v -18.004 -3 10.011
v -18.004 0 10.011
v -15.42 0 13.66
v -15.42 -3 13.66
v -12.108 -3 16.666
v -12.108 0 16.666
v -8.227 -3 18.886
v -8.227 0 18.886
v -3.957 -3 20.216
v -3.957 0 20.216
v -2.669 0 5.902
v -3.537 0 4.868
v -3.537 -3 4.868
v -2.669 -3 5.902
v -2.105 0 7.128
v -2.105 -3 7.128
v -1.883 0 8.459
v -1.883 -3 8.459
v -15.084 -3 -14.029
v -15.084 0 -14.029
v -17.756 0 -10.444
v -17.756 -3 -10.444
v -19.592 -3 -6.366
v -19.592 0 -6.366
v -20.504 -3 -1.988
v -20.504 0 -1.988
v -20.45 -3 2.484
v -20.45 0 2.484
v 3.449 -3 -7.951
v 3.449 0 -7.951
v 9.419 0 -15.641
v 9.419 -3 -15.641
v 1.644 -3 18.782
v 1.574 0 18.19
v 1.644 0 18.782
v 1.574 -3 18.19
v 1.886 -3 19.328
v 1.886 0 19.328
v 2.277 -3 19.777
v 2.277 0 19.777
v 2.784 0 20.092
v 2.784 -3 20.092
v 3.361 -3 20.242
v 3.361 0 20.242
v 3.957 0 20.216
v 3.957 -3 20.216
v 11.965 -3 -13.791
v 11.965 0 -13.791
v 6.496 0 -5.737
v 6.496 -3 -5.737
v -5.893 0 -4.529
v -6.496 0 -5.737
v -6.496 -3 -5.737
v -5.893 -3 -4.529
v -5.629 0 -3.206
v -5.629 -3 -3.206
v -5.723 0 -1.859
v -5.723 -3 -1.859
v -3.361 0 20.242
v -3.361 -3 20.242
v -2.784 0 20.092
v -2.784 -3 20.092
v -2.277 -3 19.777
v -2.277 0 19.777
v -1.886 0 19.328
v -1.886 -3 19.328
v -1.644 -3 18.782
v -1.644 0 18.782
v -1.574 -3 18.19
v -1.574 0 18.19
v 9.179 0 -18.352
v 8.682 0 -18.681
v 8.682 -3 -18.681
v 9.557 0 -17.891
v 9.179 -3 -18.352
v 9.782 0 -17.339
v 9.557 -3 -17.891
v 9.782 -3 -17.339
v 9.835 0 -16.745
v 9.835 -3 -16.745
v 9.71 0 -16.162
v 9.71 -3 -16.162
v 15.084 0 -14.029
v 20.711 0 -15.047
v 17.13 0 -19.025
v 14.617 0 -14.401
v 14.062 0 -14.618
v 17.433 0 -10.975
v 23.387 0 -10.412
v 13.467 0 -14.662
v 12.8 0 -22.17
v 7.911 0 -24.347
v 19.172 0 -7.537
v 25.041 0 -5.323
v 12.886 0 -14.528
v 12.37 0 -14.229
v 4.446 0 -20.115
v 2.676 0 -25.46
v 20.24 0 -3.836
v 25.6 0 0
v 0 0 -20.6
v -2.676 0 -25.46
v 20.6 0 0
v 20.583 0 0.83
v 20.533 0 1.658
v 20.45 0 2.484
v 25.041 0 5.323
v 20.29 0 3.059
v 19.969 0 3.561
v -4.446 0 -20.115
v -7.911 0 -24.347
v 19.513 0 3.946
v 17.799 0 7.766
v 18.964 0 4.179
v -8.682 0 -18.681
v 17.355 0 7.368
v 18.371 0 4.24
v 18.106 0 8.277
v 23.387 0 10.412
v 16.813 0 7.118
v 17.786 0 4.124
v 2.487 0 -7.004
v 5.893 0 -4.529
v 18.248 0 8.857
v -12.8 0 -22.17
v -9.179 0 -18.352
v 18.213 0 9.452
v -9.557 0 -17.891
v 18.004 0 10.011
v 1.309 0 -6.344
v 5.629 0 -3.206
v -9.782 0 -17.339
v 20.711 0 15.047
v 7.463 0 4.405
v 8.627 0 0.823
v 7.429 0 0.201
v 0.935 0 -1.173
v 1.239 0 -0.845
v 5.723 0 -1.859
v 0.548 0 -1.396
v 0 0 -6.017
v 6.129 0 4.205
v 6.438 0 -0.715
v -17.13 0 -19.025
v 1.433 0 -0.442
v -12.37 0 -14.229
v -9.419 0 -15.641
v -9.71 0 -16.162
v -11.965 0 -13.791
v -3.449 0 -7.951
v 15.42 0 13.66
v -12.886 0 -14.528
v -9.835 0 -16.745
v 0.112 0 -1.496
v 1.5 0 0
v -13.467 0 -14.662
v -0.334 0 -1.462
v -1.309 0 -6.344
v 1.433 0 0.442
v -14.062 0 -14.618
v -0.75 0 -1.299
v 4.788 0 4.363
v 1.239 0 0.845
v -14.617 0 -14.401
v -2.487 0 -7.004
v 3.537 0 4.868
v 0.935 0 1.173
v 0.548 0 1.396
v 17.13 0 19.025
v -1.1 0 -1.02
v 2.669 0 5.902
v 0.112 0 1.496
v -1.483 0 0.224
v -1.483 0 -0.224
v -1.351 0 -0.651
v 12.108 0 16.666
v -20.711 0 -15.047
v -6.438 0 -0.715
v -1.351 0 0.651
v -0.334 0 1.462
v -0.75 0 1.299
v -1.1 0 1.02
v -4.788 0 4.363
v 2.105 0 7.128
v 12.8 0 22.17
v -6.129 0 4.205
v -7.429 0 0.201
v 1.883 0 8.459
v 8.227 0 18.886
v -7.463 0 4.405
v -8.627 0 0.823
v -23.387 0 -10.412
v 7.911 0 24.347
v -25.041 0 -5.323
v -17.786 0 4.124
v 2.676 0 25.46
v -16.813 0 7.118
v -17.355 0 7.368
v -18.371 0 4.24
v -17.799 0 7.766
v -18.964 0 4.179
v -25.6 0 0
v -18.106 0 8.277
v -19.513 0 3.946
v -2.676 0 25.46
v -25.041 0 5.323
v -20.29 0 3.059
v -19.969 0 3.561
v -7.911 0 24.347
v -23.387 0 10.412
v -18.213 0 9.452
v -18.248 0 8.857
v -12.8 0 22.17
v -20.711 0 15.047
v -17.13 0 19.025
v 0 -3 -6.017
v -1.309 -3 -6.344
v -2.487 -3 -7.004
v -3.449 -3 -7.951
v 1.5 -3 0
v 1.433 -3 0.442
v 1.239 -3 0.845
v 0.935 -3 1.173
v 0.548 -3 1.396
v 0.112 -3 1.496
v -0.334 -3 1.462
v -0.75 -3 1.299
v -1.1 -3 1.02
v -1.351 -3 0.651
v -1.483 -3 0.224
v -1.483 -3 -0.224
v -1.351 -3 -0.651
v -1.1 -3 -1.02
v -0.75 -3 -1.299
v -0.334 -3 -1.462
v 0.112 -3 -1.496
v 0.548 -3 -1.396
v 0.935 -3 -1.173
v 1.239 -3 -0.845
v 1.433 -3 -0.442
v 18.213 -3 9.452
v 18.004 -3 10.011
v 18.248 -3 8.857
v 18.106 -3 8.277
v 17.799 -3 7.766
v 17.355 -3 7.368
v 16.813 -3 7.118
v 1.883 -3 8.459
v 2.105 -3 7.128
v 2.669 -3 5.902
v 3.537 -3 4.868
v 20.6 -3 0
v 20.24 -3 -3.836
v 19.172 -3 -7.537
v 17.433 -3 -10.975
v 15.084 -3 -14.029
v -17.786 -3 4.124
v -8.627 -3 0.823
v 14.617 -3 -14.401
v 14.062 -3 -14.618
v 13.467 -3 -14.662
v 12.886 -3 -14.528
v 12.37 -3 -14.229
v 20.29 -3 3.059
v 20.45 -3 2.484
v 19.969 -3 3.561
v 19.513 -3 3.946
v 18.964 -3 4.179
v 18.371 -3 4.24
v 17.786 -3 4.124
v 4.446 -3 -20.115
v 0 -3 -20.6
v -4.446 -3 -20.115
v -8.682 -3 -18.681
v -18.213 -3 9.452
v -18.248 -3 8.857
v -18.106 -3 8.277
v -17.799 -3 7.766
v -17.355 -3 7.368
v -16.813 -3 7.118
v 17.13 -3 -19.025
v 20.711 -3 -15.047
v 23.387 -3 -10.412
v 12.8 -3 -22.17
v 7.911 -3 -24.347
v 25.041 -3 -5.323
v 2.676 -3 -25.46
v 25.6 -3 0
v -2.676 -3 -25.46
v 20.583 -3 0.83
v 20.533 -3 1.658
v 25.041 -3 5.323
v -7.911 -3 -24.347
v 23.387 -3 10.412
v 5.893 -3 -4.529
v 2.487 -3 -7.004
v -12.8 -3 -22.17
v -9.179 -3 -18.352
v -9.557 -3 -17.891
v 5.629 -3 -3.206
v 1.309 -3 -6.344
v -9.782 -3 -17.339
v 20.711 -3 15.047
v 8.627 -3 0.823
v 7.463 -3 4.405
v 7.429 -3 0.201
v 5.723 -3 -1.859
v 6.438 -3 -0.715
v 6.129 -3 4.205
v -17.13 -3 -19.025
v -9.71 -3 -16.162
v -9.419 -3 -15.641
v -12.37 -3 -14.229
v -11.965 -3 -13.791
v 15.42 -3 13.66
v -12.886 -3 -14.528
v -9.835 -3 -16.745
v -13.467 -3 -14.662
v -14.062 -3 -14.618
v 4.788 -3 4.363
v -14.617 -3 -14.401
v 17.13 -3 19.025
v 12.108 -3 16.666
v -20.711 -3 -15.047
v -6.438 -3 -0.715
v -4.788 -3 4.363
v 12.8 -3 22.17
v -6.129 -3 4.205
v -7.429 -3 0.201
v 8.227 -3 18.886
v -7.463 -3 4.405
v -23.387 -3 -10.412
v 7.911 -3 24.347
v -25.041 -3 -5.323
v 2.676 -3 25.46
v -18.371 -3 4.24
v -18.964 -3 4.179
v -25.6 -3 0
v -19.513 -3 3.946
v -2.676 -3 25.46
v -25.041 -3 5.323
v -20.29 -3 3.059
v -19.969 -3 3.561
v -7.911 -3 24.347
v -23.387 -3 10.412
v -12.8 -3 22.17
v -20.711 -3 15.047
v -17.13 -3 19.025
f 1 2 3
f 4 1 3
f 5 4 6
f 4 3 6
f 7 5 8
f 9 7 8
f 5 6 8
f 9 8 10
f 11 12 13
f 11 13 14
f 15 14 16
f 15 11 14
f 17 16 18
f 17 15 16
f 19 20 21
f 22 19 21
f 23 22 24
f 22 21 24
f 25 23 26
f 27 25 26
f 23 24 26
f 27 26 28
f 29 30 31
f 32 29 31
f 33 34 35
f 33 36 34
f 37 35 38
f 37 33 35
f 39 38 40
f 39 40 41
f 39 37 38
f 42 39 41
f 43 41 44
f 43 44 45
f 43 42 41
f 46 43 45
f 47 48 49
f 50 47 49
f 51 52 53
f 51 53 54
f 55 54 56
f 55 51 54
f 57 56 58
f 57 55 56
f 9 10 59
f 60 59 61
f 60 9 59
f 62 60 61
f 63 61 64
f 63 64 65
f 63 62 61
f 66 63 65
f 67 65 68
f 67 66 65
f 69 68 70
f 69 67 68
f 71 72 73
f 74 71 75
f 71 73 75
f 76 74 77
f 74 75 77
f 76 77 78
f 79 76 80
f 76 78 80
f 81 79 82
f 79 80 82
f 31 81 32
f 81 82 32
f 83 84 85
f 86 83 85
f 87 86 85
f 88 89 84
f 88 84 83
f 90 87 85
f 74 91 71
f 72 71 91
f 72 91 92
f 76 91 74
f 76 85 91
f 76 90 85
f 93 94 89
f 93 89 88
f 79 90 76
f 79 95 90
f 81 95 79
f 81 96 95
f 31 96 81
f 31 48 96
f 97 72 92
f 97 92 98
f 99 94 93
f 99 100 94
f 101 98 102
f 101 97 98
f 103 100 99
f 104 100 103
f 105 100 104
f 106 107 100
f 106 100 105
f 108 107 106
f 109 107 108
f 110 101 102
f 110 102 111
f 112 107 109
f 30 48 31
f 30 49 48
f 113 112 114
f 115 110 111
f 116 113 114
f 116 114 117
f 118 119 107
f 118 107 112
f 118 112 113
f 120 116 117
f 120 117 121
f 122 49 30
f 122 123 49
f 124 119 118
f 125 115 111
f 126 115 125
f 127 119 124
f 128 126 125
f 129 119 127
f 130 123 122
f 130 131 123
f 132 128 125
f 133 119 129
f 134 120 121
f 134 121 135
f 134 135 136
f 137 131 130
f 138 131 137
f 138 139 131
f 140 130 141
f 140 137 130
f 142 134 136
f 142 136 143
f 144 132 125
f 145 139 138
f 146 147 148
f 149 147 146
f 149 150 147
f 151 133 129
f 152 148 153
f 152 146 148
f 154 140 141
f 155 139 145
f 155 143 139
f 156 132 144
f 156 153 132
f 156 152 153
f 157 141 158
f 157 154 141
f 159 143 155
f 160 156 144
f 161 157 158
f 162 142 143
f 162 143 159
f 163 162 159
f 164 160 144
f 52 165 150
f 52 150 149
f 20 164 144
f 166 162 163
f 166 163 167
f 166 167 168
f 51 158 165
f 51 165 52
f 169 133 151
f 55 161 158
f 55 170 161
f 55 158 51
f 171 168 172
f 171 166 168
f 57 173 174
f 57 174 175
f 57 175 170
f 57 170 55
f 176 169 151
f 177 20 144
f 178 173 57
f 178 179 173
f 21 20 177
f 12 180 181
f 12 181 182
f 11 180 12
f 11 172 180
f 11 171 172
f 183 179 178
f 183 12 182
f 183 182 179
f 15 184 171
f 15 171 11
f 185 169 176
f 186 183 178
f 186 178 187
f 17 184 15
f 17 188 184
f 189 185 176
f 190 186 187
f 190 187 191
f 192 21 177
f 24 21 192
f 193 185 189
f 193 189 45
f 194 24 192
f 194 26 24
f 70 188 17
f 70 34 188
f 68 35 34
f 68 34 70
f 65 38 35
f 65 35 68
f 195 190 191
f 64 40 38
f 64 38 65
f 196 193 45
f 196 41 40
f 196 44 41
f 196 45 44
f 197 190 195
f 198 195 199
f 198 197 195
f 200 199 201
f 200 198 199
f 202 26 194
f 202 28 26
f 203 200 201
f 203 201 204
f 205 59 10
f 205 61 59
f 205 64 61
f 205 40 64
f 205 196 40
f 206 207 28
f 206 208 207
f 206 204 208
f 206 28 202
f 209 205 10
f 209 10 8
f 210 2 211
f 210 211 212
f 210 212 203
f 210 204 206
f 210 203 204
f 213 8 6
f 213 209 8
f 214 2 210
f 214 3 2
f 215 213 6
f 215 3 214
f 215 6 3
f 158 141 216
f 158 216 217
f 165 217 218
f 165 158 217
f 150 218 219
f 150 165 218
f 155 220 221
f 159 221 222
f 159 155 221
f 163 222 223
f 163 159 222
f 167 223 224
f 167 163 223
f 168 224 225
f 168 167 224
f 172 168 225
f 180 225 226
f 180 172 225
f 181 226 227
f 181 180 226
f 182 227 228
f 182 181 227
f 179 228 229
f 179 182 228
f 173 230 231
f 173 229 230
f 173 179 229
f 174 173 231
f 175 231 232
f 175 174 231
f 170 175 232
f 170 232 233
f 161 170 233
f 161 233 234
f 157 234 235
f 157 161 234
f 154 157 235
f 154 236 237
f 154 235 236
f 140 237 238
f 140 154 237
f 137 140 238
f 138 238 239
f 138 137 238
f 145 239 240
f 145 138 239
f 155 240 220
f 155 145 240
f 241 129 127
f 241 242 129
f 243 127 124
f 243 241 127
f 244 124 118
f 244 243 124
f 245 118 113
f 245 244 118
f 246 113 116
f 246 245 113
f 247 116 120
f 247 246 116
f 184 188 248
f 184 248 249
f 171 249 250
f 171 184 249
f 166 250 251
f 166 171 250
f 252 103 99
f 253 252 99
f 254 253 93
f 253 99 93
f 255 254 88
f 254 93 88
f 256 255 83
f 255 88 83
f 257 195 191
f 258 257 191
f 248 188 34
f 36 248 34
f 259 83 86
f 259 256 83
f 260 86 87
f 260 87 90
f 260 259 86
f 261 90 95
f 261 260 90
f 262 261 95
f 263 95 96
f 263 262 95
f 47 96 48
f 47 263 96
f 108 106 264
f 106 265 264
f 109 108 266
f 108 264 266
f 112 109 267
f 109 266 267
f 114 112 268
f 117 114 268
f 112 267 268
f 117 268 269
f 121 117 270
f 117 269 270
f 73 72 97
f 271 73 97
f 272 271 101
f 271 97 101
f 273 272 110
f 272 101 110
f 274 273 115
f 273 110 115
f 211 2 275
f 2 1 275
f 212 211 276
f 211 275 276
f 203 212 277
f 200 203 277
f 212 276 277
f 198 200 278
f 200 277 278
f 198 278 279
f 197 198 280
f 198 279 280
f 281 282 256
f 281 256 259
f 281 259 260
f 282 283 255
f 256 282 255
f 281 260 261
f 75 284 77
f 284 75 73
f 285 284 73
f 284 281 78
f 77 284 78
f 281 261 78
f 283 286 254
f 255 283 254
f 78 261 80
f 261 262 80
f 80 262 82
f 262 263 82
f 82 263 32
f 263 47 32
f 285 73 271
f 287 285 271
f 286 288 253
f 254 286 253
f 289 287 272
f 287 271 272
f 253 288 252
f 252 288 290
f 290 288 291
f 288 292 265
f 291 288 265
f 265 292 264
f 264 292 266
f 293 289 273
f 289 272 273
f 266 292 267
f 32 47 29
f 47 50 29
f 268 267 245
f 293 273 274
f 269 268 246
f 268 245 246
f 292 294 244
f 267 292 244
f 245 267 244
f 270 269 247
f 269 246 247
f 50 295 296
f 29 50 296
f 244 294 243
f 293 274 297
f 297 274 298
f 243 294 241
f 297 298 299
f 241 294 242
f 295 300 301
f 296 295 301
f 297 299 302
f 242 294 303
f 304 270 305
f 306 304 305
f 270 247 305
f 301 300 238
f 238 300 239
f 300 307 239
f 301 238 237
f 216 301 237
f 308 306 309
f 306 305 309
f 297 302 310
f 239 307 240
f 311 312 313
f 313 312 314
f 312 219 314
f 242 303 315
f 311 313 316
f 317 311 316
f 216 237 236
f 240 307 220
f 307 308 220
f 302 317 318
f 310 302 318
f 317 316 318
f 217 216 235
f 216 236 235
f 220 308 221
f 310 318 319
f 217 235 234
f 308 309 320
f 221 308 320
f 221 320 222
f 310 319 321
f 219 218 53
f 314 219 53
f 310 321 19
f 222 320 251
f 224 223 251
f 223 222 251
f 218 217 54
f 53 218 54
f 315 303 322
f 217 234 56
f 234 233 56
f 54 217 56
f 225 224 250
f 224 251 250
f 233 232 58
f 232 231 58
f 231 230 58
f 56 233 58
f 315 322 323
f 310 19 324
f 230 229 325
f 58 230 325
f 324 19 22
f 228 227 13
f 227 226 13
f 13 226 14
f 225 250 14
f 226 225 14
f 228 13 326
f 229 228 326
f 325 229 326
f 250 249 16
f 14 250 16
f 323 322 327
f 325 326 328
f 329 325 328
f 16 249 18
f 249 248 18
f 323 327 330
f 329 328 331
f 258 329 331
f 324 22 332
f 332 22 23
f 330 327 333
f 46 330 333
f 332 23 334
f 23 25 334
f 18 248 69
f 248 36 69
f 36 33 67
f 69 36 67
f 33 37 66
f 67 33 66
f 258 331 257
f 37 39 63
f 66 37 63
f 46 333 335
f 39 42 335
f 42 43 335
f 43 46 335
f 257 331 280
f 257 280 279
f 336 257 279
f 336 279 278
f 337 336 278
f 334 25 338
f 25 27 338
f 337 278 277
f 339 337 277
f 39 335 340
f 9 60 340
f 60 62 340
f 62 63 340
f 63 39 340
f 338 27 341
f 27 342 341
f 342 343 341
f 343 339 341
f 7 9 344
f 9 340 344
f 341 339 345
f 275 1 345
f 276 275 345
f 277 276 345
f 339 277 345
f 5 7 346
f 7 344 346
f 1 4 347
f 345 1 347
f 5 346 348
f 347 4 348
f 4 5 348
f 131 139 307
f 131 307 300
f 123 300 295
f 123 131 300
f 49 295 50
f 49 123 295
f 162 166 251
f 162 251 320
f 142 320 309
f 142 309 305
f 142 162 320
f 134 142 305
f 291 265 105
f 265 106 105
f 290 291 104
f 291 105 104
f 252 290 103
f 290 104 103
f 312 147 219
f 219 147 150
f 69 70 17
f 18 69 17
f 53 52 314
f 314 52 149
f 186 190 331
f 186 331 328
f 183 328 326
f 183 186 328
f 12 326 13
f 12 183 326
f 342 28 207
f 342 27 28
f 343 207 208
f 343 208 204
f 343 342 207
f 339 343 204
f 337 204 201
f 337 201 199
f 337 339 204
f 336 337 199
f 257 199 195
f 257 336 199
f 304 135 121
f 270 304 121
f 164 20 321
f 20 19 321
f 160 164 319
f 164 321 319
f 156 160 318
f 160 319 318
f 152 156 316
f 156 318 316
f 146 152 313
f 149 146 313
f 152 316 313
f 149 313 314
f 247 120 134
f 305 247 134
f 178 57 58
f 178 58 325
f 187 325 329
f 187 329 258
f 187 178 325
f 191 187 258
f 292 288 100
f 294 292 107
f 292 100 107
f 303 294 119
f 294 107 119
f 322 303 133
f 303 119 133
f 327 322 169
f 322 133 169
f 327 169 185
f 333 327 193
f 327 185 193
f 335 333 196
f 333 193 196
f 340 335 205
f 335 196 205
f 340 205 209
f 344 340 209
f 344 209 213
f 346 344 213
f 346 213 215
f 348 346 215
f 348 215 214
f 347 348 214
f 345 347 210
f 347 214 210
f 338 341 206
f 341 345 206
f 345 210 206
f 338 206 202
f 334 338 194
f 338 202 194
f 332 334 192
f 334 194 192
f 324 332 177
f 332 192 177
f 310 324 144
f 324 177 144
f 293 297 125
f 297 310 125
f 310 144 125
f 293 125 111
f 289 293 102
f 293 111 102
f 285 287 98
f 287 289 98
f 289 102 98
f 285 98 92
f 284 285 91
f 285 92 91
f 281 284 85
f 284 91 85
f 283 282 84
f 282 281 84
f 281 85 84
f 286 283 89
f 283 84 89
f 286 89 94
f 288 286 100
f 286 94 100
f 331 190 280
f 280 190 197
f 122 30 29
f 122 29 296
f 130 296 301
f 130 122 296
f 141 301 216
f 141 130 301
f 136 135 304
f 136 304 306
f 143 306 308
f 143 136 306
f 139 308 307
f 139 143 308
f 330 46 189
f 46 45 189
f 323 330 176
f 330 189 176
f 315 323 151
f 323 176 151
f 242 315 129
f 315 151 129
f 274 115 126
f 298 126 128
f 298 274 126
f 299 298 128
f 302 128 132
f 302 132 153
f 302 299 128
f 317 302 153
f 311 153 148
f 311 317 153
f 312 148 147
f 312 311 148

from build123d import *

# Parameters (mm, degrees)
F0_R        = 25.6
F0_R_2      = 1.5
F1_DEPTH    = 3
F2_COUNT    = 5
F3_T1_DEPTH = 3
F4_R        = 2


# Not quite as in the source:
# - a fillet or chamfer that OpenCascade refuses, or shapes differently, is made with other operations: its cross-section is extruded or revolved along the edge and cut away or added


with BuildPart() as f1:
    # F0 (on Front) → F1 (new body)
    with BuildSketch(Plane.XZ):
        Circle(F0_R)
        with BuildLine():
            ThreePointArc((-1.4990055262, 20.5453883495), (0, 20.6), (1.4990055262, 20.5453883495))
            ThreePointArc((1.4990055262, 20.5453883495), (15.0870725099, 14.0264123382), (20.6, 0))
            ThreePointArc((20.6, 0), (-14.0264123382, -15.0870725099), (-1.4990055262, 20.5453883495))
        make_face(mode=Mode.SUBTRACT)
        with BuildLine():
            ThreePointArc((-1.9720265944, 5.6666666667), (-3.4761933515, -4.8904069139), (6, 0))
            ThreePointArc((6, 0), (4.8904069139, 3.4761933515), (1.9720265944, 5.6666666667))
            ThreePointArc((1.9720265944, 5.6666666667), (0, 6), (-1.9720265944, 5.6666666667))
        make_face()
        Circle(F0_R_2, mode=Mode.SUBTRACT)
        with BuildLine():
            ThreePointArc((-1.9720265944, 5.6666666667), (0, 6), (1.9720265944, 5.6666666667))
            Line((1.9720265944, 5.6666666667), (1.4990055262, 20.5453883495))
            ThreePointArc((1.4990055262, 20.5453883495), (0, 20.6), (-1.4990055262, 20.5453883495))
            Line((-1.4990055262, 20.5453883495), (-1.9720265944, 5.6666666667))
        make_face()
    extrude(amount=F1_DEPTH)

    # F2: F1 ×5 about axis
    f2_axis = Axis((0, 0, 0), (0, -1, 0))


with BuildPart() as f1_1:
    add(f1.part)
    for i in range(1, F2_COUNT):
        add(f1.part.rotate(f2_axis, i * 360 / F2_COUNT))

    # F3: fillet of radius 5.08 on 10 edges, made by hand

    # F3_s2 → F3_t1 (join)
    with BuildSketch(Plane.XZ):
        with BuildLine():
            ThreePointArc((1.8832465894, 8.4592124416), (2.4124774845, 6.3578379743), (3.7693220099, 4.6682128899))
            ThreePointArc((3.7693220099, 4.6682128899), (2.9137601883, 5.244997766), (1.9720265944, 5.6666666667))
            Line((1.9720265944, 5.6666666667), (1.8832465894, 8.4592124416))
        make_face()
        with BuildLine():
            ThreePointArc((3.2749497301, 5.0273953759), (5.3011666938, 4.2590824136), (7.4632339146, 4.4051143441))
            Line((7.4632339146, 4.4051143441), (4.779930528, 3.6266050443))
            ThreePointArc((4.779930528, 3.6266050443), (4.0878878875, 4.3919440592), (3.2749497301, 5.0273953759))
        make_face()
        with BuildLine():
            ThreePointArc((5.7933522546, -1.5611116727), (5.6887786813, -3.7255802818), (6.4957788146, -5.7367020526))
            Line((6.4957788146, -5.7367020526), (4.9261861245, -3.4253014855))
            ThreePointArc((4.9261861245, -3.4253014855), (5.440213845, -2.5306270607), (5.7933522546, -1.5611116727))
        make_face()
        with BuildLine():
            ThreePointArc((-3.7693220099, 4.6682128899), (-2.4124774845, 6.3578379743), (-1.8832465894, 8.4592124416))
            Line((-1.8832465894, 8.4592124416), (-1.9720265944, 5.6666666667))
            ThreePointArc((-1.9720265944, 5.6666666667), (-2.9137601883, 5.244997766), (-3.7693220099, 4.6682128899))
        make_face()
        with BuildLine():
            ThreePointArc((-7.4632339146, 4.4051143441), (-5.3011666938, 4.2590824136), (-3.2749497301, 5.0273953759))
            ThreePointArc((-3.2749497301, 5.0273953759), (-4.0878878875, 4.3919440592), (-4.779930528, 3.6266050443))
            Line((-4.779930528, 3.6266050443), (-7.4632339146, 4.4051143441))
        make_face()
        with BuildLine():
            ThreePointArc((-5.6045188467, -2.1422811432), (-6.7921597763, -0.3297224505), (-8.627144316, 0.8229664629))
            Line((-8.627144316, 0.8229664629), (-5.99870999, -0.1244124414))
            ThreePointArc((-5.99870999, -0.1244124414), (-5.888690719, -1.1503571689), (-5.6045188467, -2.1422811432))
        make_face()
        with BuildLine():
            ThreePointArc((-6.4957788146, -5.7367020526), (-5.6887786813, -3.7255802818), (-5.7933522546, -1.5611116727))
            ThreePointArc((-5.7933522546, -1.5611116727), (-5.440213845, -2.5306270607), (-4.9261861245, -3.4253014855))
            Line((-4.9261861245, -3.4253014855), (-6.4957788146, -5.7367020526))
        make_face()
        with BuildLine():
            ThreePointArc((0.3055388721, -5.9922154499), (-1.7853081143, -6.5616176556), (-3.4486218238, -7.950591196))
            Line((-3.4486218238, -7.950591196), (-1.7353800681, -5.7435577841))
            ThreePointArc((-1.7353800681, -5.7435577841), (-0.7256508252, -5.9559575955), (0.3055388721, -5.9922154499))
        make_face()
        with BuildLine():
            ThreePointArc((3.4486218238, -7.950591196), (1.7853081143, -6.5616176556), (-0.3055388721, -5.9922154499))
            ThreePointArc((-0.3055388721, -5.9922154499), (0.7256508252, -5.9559575955), (1.7353800681, -5.7435577841))
            Line((1.7353800681, -5.7435577841), (3.4486218238, -7.950591196))
        make_face()
        with BuildLine():
            ThreePointArc((8.627144316, 0.8229664629), (6.7921597763, -0.3297224505), (5.6045188467, -2.1422811432))
            ThreePointArc((5.6045188467, -2.1422811432), (5.888690719, -1.1503571689), (5.99870999, -0.1244124414))
            Line((5.99870999, -0.1244124414), (8.627144316, 0.8229664629))
        make_face()
    extrude(amount=F3_T1_DEPTH)

    # F4
    f4_edges = [f1_1.edges().sort_by_distance(p)[0] for p in [
        (1.499006, -1.5, 20.545388),
        (-20.003044, -1.5, 4.923235),
        (20.003044, -1.5, 4.923235),
        (10.863555, -1.5, -17.502662),
        (-1.499006, -1.5, 20.545388),
        (19.076607, -1.5, 7.774513),
        (13.288997, -1.5, -15.740475),
        (-19.076607, -1.5, 7.774513),
        (-10.863555, -1.5, -17.502662),
        (-13.288997, -1.5, -15.740475),
    ]]
    fillet(f4_edges, radius=F4_R)


solid = f1_1.part
